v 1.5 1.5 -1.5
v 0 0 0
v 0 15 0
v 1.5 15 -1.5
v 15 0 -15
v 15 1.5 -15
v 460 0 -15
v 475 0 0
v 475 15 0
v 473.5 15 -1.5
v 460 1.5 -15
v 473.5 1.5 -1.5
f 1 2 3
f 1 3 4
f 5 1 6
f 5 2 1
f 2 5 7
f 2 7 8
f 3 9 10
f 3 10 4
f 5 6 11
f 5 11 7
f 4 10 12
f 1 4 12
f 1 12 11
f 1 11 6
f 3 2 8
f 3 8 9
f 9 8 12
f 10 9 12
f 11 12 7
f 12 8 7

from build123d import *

# Parameters (mm, degrees)
EXTRUDE_1_DEPTH     = 475
CUT_EXTRUDE_1_DEPTH = 16


with BuildPart() as part:
    # Эскиз1 → Бобышка-Вытянуть1 (new body)
    with BuildSketch(Plane(origin=(0, 0, 0), x_dir=(0, 0, -1), z_dir=(1, 0, 0))):
        Polygon((0, 0), (0, 15), (1.5, 15), (1.5, 1.5), (15, 1.5), (15, 0), align=None)
    extrude(amount=EXTRUDE_1_DEPTH)

    # Эскиз2 → Вырез-Вытянуть1 (cut, through all)
    with BuildSketch(Plane.XZ):
        Polygon((475, 0), (454.951956964, -20.048043036), (475, -20.048043036), align=None)
    cut_extrude_1 = extrude(amount=-CUT_EXTRUDE_1_DEPTH, mode=Mode.SUBTRACT)

    # Зеркальное отражение1: Вырез-Вытянуть1 across plane
    add(cut_extrude_1.mirror(Plane(origin=(237.5, 0, 0), x_dir=(0, 0, 1), z_dir=(1, 0, 0))), mode=Mode.SUBTRACT)


solid = part.part
